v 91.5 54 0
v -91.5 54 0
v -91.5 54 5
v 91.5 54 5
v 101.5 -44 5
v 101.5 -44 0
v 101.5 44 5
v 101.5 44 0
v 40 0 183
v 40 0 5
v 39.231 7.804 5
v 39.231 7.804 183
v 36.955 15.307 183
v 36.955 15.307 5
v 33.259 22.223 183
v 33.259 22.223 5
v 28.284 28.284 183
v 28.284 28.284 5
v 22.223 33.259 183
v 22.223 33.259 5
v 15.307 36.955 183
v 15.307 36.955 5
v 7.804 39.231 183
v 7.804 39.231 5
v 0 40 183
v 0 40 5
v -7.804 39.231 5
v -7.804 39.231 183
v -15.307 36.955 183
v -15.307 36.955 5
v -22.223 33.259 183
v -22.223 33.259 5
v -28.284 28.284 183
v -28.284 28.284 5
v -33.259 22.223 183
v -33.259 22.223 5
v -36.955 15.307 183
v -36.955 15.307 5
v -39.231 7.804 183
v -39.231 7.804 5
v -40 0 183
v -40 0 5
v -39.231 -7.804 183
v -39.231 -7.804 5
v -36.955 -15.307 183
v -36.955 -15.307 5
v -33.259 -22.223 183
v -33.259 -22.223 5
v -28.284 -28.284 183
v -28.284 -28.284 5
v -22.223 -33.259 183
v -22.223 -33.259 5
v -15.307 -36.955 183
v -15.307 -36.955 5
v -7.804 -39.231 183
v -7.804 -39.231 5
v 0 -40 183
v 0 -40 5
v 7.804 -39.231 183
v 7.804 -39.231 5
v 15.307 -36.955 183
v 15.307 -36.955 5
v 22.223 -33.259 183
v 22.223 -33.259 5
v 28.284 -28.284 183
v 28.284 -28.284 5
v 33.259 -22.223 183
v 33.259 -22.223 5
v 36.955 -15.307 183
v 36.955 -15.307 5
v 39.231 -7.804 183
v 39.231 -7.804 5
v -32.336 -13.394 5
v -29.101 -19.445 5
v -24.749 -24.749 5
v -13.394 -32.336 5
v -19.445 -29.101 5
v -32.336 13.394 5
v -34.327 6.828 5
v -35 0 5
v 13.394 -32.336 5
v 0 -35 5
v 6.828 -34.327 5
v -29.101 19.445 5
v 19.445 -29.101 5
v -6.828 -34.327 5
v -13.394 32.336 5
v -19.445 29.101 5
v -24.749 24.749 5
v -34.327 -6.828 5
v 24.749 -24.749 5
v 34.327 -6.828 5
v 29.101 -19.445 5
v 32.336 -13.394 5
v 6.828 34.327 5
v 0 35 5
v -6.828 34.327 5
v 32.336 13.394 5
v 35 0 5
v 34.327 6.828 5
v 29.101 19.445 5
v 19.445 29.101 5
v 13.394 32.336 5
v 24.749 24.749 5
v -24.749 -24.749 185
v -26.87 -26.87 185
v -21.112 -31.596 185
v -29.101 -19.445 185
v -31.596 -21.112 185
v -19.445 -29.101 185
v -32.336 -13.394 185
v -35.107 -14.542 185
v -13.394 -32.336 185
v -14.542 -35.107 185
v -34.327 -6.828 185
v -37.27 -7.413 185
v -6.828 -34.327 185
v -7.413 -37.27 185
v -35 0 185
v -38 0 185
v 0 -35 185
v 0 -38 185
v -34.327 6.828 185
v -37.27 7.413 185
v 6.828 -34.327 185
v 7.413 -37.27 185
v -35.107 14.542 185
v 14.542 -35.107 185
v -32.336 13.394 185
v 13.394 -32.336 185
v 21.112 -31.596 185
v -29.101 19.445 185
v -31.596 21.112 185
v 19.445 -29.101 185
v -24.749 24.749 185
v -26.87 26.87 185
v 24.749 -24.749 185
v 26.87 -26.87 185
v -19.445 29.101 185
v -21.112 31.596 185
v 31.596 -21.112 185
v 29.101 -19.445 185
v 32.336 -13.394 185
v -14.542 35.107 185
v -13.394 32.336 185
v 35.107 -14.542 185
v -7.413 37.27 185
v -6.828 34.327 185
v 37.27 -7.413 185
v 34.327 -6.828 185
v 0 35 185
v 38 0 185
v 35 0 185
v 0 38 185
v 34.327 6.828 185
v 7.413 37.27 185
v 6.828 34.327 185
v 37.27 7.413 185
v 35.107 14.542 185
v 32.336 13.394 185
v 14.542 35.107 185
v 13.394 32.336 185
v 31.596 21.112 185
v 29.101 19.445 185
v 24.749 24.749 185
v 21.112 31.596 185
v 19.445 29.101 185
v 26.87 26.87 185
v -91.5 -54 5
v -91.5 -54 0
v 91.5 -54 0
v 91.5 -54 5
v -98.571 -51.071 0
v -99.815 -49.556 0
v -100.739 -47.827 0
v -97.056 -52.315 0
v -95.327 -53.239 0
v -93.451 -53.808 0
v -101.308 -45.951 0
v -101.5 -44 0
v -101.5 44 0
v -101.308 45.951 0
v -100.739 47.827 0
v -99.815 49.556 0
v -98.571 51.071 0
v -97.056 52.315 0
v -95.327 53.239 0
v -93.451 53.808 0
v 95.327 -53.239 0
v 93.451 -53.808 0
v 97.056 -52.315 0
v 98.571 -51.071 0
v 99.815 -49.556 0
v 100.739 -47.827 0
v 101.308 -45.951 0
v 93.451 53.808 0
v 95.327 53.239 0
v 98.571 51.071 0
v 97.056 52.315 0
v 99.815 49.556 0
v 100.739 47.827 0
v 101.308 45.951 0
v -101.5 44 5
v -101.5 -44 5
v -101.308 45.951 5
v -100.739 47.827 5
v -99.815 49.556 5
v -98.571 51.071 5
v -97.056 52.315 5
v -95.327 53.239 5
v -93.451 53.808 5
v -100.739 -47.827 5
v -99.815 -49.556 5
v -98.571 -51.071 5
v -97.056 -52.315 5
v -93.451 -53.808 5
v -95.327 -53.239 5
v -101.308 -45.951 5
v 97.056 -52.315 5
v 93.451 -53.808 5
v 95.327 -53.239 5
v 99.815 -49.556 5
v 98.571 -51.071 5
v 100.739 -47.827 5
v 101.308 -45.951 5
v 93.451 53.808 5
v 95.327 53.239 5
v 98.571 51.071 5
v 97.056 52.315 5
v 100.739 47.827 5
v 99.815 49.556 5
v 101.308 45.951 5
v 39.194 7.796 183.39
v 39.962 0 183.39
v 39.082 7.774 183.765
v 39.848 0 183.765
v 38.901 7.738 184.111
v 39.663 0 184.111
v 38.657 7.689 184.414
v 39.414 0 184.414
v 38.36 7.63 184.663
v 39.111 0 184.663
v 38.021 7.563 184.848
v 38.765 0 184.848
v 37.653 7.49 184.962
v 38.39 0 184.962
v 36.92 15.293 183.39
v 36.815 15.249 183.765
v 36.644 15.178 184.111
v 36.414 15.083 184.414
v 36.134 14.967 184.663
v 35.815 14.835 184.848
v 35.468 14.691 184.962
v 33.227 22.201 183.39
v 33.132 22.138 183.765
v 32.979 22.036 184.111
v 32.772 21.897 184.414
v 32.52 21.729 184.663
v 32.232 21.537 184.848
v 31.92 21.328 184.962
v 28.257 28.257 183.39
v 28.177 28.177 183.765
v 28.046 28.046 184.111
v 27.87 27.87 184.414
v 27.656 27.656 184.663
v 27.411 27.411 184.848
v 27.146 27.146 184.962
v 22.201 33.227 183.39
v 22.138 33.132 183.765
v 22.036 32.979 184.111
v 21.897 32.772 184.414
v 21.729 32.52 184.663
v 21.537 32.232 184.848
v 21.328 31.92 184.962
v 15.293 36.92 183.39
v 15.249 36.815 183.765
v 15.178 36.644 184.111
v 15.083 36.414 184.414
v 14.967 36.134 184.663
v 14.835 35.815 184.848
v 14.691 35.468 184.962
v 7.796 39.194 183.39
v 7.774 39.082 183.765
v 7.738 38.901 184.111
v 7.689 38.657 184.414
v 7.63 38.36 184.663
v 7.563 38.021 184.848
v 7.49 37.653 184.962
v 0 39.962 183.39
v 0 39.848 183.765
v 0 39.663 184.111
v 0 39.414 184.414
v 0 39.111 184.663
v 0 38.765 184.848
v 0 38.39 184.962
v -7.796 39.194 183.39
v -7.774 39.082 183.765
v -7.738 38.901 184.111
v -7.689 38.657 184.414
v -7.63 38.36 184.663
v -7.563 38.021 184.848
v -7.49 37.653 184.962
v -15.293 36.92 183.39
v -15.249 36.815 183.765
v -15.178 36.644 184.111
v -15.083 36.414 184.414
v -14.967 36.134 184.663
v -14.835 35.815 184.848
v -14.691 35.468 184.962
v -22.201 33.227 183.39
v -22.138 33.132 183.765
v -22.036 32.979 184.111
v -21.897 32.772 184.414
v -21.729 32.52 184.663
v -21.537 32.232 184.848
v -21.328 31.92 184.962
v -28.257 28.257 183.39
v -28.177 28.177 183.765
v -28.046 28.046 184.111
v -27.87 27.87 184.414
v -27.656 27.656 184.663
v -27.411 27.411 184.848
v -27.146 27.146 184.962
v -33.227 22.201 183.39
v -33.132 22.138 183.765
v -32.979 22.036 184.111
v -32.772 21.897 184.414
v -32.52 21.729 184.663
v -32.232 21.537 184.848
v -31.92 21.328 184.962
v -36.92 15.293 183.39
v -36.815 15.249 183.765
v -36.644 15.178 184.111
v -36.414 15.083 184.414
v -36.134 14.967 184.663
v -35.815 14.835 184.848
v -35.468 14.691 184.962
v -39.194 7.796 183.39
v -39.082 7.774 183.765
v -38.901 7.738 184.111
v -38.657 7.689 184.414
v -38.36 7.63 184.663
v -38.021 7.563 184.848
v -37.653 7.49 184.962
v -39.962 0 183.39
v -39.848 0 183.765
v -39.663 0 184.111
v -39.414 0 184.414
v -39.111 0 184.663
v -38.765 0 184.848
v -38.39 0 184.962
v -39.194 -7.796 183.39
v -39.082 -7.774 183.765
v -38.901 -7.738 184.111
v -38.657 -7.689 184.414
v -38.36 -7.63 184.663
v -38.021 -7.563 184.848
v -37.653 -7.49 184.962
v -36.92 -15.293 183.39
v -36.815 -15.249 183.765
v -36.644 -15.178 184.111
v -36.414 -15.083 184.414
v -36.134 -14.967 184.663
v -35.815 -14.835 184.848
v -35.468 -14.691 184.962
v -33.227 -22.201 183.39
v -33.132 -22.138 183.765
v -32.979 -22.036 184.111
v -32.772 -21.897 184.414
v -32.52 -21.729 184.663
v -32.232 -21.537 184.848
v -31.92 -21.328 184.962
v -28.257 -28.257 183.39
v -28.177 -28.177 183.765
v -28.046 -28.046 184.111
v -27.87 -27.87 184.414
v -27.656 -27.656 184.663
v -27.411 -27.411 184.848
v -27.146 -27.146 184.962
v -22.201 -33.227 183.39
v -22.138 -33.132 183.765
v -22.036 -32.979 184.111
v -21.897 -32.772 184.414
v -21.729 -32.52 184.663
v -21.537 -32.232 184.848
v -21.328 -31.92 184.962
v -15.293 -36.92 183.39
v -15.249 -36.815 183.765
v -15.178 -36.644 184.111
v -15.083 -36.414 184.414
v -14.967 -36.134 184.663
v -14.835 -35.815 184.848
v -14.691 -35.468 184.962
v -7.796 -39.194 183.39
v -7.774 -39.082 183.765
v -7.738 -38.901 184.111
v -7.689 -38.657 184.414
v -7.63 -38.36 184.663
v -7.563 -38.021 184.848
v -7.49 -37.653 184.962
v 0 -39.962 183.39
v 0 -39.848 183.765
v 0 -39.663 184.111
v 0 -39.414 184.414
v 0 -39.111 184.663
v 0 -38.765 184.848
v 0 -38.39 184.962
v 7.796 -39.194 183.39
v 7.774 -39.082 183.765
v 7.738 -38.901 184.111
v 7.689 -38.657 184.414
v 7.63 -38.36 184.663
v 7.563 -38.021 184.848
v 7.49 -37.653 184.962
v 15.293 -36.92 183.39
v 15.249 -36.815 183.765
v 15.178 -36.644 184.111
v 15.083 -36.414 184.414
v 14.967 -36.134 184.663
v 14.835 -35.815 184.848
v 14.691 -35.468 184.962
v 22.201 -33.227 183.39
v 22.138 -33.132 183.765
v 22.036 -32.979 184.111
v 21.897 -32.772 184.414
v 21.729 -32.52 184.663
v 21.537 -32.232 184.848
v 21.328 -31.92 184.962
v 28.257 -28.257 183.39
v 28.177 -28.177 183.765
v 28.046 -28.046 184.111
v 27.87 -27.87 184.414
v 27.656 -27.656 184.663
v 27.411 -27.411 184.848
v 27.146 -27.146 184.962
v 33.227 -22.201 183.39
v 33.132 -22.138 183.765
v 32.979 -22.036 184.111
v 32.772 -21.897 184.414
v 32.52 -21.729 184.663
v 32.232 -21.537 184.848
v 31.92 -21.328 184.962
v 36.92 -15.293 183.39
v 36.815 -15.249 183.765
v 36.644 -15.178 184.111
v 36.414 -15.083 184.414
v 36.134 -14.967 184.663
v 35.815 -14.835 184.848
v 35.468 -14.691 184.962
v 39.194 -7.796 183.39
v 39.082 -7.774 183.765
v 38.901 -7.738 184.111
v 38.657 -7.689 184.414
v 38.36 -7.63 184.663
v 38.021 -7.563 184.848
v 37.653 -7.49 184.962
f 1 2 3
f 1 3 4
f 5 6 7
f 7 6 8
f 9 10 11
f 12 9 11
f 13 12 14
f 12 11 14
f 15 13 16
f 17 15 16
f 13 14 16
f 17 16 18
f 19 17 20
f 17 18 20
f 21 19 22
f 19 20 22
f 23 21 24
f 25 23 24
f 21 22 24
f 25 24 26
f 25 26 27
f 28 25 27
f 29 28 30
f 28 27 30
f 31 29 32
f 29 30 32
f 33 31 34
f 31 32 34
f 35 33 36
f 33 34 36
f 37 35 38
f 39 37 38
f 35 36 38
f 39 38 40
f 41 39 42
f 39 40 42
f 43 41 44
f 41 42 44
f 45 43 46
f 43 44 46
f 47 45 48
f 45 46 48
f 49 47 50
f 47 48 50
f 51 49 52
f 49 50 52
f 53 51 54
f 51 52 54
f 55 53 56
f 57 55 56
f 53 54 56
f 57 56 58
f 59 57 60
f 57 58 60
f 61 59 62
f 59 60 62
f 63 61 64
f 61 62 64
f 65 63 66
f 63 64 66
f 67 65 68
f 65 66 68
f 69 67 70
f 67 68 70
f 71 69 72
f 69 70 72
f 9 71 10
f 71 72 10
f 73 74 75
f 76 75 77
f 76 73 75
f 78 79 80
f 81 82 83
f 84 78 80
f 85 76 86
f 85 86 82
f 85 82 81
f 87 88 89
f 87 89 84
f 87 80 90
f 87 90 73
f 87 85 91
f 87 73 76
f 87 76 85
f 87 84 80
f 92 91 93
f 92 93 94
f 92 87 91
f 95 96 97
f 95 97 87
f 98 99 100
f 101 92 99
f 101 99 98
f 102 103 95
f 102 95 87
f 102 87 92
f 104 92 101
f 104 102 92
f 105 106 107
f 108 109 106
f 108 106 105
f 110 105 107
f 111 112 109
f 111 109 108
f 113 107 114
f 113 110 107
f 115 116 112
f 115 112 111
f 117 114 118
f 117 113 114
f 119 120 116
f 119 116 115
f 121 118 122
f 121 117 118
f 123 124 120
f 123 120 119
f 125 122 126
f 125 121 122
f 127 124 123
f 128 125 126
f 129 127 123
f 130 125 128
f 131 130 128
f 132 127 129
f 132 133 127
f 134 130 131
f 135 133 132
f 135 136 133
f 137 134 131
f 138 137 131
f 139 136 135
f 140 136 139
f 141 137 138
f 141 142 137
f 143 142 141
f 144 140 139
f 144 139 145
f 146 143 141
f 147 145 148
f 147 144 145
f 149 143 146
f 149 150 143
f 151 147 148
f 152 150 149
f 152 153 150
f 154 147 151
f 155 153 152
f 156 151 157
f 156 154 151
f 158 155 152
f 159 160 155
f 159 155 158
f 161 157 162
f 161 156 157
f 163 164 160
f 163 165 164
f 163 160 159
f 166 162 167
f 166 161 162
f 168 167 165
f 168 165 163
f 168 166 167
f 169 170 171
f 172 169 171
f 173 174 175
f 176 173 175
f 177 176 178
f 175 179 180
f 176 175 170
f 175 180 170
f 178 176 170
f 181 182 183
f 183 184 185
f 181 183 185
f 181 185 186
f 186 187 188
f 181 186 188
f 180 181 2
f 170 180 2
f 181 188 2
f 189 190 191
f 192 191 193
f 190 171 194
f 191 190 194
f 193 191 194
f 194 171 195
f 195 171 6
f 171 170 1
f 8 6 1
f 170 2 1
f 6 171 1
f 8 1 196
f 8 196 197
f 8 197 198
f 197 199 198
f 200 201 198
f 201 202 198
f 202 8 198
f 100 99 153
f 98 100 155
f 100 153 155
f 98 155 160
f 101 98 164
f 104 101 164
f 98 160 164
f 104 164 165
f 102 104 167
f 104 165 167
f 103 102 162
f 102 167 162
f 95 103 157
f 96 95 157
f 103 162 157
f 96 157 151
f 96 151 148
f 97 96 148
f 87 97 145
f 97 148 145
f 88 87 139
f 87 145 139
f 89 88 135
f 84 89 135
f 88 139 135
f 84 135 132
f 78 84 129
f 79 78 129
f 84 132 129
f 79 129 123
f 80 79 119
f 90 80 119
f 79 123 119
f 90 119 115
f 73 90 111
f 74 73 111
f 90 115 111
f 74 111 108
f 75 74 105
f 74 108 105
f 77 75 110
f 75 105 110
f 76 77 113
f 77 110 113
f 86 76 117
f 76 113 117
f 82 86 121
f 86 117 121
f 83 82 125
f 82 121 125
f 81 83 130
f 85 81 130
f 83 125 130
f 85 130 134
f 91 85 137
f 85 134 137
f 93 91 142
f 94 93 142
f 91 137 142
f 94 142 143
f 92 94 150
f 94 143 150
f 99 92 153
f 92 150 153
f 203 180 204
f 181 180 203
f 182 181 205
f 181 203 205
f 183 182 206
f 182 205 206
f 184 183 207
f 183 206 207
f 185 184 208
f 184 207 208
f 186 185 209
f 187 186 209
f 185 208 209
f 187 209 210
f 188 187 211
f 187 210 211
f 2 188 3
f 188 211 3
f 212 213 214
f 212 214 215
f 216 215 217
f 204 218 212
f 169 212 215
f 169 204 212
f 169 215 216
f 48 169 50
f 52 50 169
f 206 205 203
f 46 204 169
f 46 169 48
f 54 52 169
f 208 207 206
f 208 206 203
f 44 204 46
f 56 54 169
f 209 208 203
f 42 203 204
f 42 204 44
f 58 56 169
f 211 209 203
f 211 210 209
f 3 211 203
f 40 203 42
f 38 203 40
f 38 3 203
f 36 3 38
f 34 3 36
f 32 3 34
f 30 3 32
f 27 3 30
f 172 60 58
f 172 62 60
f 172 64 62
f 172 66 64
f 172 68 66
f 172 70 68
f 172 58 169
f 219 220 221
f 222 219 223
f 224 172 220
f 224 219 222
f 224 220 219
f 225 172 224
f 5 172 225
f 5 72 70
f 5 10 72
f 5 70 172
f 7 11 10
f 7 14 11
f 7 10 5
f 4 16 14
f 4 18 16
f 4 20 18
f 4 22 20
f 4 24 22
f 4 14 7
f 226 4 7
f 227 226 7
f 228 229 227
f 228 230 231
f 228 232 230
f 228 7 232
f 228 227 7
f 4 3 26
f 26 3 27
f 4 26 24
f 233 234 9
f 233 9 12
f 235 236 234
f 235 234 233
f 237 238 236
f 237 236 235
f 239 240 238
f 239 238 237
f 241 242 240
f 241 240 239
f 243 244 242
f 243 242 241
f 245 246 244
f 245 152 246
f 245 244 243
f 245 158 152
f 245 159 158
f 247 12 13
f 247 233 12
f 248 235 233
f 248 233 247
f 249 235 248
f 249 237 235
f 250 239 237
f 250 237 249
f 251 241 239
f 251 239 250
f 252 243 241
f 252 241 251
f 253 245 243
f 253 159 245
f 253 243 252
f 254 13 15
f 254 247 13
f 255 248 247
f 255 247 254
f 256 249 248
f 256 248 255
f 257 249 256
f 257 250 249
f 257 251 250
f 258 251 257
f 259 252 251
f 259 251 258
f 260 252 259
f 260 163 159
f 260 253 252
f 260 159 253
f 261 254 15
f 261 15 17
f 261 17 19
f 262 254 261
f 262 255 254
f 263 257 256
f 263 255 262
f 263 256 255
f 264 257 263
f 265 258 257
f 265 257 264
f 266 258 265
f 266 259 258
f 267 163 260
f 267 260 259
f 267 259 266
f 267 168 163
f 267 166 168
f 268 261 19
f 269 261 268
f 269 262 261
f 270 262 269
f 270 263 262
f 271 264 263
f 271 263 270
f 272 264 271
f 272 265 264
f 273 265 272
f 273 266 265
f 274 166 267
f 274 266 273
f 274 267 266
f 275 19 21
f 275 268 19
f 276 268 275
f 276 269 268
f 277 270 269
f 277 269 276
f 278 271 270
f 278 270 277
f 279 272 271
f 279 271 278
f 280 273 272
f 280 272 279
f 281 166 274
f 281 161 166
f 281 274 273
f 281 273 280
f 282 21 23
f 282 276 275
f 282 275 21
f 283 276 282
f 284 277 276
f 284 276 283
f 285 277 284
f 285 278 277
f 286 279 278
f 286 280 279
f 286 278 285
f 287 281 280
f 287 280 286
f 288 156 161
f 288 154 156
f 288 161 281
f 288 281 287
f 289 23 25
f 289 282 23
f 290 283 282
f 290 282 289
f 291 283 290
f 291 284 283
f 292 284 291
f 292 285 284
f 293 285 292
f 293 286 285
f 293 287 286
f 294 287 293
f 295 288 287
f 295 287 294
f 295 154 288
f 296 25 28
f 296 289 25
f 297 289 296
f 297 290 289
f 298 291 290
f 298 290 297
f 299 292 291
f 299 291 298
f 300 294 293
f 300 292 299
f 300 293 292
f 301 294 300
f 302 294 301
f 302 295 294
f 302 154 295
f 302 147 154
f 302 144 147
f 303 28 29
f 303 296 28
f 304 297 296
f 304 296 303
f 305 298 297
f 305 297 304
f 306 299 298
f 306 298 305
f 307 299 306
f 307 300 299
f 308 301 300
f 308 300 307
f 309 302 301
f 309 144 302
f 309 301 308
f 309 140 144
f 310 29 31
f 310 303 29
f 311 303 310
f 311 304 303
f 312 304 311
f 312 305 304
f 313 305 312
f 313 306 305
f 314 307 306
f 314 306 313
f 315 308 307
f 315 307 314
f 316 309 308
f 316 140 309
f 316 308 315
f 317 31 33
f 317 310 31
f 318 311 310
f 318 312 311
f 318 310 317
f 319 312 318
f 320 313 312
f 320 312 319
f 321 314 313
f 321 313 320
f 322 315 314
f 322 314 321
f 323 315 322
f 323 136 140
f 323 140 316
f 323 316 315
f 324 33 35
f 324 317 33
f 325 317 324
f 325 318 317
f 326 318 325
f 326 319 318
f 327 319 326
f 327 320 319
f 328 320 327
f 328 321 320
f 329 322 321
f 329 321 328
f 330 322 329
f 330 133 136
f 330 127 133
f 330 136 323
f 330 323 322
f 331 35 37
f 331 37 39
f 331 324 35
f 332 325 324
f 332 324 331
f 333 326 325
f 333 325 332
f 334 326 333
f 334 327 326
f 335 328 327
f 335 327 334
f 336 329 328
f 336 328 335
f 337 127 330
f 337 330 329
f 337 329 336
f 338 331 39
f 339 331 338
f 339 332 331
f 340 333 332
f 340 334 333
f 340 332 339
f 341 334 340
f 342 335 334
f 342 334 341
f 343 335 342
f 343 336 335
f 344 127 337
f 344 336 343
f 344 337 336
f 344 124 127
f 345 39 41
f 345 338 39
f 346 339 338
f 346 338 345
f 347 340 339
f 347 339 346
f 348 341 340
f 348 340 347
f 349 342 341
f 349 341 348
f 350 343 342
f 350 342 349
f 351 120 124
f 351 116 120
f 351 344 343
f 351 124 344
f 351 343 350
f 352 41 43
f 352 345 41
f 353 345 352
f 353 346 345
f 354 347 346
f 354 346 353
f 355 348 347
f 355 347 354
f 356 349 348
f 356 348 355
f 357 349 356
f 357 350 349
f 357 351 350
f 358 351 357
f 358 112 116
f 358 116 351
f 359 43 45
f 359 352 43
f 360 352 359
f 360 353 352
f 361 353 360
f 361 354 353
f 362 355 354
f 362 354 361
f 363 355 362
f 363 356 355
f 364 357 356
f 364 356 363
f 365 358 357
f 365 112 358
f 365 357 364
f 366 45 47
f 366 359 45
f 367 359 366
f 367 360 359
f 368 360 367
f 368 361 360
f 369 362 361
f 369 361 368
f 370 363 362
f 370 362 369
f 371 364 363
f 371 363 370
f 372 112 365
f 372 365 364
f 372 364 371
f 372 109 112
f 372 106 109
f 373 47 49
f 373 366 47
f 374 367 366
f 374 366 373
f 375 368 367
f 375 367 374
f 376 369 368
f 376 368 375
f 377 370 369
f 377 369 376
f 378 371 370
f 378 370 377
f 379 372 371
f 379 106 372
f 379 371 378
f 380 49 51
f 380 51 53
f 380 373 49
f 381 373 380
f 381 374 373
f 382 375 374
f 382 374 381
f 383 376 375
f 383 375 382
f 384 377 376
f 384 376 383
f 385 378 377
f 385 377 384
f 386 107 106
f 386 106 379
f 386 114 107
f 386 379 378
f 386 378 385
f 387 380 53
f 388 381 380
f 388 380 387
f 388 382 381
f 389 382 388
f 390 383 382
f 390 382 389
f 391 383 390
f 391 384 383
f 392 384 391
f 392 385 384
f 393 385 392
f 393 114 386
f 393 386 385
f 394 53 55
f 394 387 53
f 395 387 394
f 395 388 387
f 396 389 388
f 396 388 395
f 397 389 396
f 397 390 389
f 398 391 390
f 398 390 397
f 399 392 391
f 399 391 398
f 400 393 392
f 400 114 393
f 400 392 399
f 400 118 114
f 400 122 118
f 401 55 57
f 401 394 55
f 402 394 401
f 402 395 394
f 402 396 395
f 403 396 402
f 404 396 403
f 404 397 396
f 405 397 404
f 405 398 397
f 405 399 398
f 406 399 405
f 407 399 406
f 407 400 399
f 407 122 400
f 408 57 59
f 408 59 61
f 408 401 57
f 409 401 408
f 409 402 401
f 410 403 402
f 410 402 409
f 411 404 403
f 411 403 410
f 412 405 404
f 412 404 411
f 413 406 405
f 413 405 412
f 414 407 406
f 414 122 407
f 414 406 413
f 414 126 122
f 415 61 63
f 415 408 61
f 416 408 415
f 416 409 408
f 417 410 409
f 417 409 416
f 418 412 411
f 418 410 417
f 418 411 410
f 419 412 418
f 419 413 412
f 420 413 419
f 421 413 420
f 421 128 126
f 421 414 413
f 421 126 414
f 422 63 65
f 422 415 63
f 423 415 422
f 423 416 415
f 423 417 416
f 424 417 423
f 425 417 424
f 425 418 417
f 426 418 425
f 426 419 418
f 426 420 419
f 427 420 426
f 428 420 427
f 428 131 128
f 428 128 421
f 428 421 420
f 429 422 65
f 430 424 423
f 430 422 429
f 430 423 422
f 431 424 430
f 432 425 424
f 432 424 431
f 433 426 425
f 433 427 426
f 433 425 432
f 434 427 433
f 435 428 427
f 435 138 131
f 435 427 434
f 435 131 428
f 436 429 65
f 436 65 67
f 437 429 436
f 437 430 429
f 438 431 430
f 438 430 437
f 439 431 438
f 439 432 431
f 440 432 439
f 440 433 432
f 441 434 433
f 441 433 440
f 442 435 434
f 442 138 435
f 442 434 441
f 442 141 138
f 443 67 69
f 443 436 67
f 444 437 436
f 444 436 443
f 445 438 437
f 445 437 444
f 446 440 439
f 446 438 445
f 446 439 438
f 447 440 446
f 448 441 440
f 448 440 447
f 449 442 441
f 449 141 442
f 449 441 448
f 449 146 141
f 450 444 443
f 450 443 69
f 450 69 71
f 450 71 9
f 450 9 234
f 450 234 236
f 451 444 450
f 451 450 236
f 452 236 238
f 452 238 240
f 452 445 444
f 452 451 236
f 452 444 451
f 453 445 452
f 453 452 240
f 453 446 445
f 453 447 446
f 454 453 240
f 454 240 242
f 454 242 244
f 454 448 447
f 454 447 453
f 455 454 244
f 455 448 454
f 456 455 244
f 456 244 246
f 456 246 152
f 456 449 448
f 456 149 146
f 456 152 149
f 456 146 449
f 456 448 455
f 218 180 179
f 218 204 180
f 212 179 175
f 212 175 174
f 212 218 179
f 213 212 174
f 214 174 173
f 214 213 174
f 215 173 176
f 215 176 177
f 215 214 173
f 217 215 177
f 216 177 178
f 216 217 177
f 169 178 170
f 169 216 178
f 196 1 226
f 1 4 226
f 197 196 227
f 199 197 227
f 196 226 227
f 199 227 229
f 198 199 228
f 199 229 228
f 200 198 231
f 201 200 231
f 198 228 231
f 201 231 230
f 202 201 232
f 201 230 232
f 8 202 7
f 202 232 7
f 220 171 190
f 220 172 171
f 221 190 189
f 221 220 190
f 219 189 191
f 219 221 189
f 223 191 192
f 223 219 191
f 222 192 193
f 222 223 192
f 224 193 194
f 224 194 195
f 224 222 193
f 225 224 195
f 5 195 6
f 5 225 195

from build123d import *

# Parameters (mm, degrees)
F0_W     = 203
F0_H     = 108
F1_DEPTH = 5
F2_R     = 40
F3_DEPTH = 180
F4_R     = 35
F5_DEPTH = 180
F6_R     = 10
F7_R     = 2


with BuildPart() as f1:
    # F0 (on Top) → F1 (new body)
    with BuildSketch(Plane.XY):
        Rectangle(F0_W, F0_H)
    extrude(amount=F1_DEPTH)

    # F2 (on face) → F3 (join)
    with BuildSketch(Plane.XY.offset(5)):
        Circle(F2_R)
    extrude(amount=F3_DEPTH)

    # F4 (on face) → F5 (cut)
    with BuildSketch(Plane.XY.offset(185)):
        Circle(F4_R)
    extrude(amount=-F5_DEPTH, mode=Mode.SUBTRACT)

    # F6
    f6_edges = [f1.edges().sort_by_distance(p)[0] for p in [
        (101.5, -54, 2.5),
        (101.5, 54, 2.5),
        (-101.5, 54, 2.5),
        (-101.5, -54, 2.5),
    ]]
    fillet(f6_edges, radius=F6_R)

    # F7
    f7_edges = [f1.edges().sort_by_distance(p)[0] for p in [
        (-40, 0, 185),
    ]]
    fillet(f7_edges, radius=F7_R)


solid = f1.part
